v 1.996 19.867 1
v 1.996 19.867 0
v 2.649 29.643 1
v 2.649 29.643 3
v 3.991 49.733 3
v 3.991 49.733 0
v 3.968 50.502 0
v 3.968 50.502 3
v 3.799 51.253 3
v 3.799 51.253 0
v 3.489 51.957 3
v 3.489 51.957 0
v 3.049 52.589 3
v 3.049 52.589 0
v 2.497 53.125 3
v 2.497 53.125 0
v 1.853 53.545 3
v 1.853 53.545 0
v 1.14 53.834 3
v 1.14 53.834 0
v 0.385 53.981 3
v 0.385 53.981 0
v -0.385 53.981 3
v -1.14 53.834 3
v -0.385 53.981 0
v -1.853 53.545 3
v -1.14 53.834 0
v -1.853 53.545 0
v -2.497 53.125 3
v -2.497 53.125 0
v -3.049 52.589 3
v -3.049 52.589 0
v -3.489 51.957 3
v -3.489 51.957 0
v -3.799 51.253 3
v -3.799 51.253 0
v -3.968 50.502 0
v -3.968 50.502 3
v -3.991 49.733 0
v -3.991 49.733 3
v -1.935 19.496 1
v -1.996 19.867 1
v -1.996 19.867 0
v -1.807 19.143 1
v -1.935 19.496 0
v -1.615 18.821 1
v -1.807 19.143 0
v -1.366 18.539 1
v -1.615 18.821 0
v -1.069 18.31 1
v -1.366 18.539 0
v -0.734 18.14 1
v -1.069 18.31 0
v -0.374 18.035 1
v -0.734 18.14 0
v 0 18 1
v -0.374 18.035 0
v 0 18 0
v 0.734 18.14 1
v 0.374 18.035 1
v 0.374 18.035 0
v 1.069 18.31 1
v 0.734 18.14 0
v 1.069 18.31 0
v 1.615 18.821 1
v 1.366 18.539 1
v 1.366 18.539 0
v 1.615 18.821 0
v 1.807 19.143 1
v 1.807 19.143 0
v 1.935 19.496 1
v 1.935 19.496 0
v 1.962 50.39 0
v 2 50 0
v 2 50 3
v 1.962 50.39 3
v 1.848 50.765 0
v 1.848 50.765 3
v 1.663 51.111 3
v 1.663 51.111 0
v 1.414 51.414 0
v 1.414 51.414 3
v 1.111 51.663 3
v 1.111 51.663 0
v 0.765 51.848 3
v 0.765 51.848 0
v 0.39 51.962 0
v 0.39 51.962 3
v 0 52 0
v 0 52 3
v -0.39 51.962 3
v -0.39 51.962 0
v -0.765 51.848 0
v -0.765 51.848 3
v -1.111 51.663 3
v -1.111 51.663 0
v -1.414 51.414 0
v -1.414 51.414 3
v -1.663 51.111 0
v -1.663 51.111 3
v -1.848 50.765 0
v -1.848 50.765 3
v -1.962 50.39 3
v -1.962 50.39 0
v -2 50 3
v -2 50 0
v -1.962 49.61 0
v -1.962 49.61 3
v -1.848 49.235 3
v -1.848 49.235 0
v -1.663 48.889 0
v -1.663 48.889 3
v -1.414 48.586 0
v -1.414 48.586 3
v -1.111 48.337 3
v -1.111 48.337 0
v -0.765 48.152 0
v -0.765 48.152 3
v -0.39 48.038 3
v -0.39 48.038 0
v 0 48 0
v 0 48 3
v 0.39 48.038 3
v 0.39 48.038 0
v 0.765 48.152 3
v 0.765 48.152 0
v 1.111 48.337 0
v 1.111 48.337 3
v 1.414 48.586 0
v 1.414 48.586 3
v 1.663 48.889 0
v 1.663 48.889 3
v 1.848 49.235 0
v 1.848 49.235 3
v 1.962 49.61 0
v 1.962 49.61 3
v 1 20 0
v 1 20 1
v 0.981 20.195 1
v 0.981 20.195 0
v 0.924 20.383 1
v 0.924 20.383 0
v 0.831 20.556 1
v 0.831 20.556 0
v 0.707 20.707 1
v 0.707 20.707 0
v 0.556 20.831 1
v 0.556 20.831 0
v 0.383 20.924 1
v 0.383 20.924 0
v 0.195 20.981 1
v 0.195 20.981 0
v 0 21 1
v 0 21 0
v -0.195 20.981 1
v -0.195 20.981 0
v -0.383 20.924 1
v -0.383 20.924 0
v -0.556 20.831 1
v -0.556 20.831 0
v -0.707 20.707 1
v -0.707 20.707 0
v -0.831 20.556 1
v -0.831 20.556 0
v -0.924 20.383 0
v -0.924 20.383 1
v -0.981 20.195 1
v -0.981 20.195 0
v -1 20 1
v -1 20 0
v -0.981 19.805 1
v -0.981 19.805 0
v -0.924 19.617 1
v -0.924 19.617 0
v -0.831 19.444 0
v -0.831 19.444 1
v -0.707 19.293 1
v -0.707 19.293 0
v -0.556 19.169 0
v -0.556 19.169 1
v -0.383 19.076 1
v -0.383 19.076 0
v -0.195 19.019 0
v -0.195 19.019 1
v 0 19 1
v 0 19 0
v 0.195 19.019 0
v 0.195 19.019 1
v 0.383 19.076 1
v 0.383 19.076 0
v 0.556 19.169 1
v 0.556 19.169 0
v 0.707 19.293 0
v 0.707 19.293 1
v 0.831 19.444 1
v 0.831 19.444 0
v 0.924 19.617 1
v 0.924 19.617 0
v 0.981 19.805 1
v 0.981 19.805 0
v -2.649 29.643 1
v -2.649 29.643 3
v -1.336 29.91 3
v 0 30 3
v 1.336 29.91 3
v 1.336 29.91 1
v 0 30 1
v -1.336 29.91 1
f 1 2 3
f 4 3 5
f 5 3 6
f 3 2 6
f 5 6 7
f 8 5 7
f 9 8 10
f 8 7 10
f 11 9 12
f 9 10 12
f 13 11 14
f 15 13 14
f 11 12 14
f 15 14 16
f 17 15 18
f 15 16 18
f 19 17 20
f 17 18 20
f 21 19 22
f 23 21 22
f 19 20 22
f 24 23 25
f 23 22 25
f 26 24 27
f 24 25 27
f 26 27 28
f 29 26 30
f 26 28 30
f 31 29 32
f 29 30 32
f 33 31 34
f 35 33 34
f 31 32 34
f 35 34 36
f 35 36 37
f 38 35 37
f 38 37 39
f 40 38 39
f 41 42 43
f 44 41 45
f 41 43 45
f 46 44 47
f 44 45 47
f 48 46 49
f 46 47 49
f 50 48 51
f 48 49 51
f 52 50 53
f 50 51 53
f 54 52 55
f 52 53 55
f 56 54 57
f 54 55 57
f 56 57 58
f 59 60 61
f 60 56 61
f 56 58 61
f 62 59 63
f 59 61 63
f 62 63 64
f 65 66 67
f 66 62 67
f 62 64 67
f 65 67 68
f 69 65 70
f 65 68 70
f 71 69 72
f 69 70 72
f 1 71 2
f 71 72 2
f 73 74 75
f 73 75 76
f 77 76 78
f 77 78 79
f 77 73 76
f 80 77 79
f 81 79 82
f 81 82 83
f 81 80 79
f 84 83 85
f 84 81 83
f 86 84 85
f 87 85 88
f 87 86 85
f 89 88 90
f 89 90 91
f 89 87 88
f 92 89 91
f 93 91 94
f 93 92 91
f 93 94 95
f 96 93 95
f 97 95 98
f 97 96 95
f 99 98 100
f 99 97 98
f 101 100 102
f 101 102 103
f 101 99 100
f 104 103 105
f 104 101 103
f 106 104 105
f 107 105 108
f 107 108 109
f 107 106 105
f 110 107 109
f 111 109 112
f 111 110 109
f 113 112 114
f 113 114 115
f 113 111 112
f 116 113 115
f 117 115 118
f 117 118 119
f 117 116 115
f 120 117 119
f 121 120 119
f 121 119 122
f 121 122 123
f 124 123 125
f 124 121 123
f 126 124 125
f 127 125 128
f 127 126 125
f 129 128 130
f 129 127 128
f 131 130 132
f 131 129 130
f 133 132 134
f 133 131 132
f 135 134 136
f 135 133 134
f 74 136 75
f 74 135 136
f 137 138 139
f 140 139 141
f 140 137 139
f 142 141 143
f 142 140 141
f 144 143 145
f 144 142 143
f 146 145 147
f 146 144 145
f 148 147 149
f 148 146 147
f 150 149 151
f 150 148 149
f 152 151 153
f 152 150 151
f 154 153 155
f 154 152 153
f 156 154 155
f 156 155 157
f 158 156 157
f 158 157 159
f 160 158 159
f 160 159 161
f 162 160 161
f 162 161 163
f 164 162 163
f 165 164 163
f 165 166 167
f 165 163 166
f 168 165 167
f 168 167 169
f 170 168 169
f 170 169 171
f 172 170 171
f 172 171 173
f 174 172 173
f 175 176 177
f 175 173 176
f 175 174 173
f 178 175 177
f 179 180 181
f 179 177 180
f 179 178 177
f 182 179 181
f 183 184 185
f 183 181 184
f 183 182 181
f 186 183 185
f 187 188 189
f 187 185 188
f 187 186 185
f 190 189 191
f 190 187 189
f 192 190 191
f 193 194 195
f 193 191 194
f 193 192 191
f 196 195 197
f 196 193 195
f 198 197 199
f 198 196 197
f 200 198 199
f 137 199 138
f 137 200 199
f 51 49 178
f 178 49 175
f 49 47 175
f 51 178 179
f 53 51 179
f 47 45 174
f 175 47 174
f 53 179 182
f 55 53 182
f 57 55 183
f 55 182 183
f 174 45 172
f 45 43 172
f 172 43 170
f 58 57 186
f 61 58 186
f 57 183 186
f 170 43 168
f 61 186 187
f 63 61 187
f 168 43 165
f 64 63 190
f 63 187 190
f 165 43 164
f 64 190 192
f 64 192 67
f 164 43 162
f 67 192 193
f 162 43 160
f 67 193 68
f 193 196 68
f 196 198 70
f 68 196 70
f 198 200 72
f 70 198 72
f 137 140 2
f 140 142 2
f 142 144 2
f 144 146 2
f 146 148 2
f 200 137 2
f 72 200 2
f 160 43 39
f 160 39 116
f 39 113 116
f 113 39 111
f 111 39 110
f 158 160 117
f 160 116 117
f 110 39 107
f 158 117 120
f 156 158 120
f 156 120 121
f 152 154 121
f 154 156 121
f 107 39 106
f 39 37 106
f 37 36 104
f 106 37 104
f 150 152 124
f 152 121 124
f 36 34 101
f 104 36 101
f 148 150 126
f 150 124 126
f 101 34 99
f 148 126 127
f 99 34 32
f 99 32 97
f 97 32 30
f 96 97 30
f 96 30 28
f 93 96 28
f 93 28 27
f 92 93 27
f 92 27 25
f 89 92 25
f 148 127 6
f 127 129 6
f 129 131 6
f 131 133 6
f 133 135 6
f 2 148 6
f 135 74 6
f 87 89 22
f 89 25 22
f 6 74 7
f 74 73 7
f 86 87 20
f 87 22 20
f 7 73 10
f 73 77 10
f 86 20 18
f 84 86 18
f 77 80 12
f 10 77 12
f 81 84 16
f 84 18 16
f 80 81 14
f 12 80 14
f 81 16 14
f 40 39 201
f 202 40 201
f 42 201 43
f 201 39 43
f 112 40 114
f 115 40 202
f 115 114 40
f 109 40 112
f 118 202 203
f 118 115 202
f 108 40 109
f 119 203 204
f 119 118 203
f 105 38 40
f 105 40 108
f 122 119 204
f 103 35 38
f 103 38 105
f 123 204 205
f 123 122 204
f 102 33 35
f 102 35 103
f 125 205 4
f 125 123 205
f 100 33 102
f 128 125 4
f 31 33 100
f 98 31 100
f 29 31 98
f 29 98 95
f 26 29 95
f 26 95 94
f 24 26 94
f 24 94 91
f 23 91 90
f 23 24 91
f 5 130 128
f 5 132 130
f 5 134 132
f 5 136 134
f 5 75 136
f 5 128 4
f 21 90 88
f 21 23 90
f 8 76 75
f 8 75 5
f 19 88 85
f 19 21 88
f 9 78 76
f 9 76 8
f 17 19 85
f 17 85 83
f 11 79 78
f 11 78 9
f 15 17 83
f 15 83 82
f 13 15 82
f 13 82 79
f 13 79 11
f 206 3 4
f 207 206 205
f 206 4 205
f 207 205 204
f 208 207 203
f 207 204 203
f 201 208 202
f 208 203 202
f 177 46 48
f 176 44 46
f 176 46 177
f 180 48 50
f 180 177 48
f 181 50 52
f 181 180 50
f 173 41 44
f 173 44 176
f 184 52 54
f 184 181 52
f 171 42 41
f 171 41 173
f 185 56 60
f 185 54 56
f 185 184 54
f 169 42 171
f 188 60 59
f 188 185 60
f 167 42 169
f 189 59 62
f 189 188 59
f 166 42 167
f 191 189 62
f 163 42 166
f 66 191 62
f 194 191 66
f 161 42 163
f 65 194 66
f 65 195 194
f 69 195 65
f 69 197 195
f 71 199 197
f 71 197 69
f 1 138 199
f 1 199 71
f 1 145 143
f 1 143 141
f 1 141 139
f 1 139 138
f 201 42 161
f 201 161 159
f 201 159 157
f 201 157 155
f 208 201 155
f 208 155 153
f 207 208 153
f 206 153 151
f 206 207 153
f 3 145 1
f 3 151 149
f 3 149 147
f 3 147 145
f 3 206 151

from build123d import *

# Parameters (mm, degrees)
SKETCH1_R           = 2
SKETCH1_R_2         = 1
BOSS_EXTRUDE1_DEPTH = 3
SKETCH2_R           = 10
CUT_EXTRUDE1_DEPTH  = 2


with BuildPart() as part:
    # Sketch1 → Boss-Extrude1 (new body)
    with BuildSketch(Plane.XY):
        with BuildLine():
            Line((1.995550606, 19.866666667), (3.991101213, 49.733333333))
            ThreePointArc((3.991101213, 49.733333333), (0, 54), (-3.991101213, 49.733333333))
            Line((-3.991101213, 49.733333333), (-1.995550606, 19.866666667))
            ThreePointArc((-1.995550606, 19.866666667), (0, 18), (1.995550606, 19.866666667))
        make_face()
        with Locations((0, 50)):
            Circle(SKETCH1_R, mode=Mode.SUBTRACT)
        with Locations((0, 20)):
            Circle(SKETCH1_R_2, mode=Mode.SUBTRACT)
    extrude(amount=BOSS_EXTRUDE1_DEPTH)

    # Sketch2 → Cut-Extrude1 (cut)
    with BuildSketch(Plane.XY.offset(3)):
        with Locations((0, 20)):
            Circle(SKETCH2_R)
    extrude(amount=-CUT_EXTRUDE1_DEPTH, mode=Mode.SUBTRACT)


solid = part.part
